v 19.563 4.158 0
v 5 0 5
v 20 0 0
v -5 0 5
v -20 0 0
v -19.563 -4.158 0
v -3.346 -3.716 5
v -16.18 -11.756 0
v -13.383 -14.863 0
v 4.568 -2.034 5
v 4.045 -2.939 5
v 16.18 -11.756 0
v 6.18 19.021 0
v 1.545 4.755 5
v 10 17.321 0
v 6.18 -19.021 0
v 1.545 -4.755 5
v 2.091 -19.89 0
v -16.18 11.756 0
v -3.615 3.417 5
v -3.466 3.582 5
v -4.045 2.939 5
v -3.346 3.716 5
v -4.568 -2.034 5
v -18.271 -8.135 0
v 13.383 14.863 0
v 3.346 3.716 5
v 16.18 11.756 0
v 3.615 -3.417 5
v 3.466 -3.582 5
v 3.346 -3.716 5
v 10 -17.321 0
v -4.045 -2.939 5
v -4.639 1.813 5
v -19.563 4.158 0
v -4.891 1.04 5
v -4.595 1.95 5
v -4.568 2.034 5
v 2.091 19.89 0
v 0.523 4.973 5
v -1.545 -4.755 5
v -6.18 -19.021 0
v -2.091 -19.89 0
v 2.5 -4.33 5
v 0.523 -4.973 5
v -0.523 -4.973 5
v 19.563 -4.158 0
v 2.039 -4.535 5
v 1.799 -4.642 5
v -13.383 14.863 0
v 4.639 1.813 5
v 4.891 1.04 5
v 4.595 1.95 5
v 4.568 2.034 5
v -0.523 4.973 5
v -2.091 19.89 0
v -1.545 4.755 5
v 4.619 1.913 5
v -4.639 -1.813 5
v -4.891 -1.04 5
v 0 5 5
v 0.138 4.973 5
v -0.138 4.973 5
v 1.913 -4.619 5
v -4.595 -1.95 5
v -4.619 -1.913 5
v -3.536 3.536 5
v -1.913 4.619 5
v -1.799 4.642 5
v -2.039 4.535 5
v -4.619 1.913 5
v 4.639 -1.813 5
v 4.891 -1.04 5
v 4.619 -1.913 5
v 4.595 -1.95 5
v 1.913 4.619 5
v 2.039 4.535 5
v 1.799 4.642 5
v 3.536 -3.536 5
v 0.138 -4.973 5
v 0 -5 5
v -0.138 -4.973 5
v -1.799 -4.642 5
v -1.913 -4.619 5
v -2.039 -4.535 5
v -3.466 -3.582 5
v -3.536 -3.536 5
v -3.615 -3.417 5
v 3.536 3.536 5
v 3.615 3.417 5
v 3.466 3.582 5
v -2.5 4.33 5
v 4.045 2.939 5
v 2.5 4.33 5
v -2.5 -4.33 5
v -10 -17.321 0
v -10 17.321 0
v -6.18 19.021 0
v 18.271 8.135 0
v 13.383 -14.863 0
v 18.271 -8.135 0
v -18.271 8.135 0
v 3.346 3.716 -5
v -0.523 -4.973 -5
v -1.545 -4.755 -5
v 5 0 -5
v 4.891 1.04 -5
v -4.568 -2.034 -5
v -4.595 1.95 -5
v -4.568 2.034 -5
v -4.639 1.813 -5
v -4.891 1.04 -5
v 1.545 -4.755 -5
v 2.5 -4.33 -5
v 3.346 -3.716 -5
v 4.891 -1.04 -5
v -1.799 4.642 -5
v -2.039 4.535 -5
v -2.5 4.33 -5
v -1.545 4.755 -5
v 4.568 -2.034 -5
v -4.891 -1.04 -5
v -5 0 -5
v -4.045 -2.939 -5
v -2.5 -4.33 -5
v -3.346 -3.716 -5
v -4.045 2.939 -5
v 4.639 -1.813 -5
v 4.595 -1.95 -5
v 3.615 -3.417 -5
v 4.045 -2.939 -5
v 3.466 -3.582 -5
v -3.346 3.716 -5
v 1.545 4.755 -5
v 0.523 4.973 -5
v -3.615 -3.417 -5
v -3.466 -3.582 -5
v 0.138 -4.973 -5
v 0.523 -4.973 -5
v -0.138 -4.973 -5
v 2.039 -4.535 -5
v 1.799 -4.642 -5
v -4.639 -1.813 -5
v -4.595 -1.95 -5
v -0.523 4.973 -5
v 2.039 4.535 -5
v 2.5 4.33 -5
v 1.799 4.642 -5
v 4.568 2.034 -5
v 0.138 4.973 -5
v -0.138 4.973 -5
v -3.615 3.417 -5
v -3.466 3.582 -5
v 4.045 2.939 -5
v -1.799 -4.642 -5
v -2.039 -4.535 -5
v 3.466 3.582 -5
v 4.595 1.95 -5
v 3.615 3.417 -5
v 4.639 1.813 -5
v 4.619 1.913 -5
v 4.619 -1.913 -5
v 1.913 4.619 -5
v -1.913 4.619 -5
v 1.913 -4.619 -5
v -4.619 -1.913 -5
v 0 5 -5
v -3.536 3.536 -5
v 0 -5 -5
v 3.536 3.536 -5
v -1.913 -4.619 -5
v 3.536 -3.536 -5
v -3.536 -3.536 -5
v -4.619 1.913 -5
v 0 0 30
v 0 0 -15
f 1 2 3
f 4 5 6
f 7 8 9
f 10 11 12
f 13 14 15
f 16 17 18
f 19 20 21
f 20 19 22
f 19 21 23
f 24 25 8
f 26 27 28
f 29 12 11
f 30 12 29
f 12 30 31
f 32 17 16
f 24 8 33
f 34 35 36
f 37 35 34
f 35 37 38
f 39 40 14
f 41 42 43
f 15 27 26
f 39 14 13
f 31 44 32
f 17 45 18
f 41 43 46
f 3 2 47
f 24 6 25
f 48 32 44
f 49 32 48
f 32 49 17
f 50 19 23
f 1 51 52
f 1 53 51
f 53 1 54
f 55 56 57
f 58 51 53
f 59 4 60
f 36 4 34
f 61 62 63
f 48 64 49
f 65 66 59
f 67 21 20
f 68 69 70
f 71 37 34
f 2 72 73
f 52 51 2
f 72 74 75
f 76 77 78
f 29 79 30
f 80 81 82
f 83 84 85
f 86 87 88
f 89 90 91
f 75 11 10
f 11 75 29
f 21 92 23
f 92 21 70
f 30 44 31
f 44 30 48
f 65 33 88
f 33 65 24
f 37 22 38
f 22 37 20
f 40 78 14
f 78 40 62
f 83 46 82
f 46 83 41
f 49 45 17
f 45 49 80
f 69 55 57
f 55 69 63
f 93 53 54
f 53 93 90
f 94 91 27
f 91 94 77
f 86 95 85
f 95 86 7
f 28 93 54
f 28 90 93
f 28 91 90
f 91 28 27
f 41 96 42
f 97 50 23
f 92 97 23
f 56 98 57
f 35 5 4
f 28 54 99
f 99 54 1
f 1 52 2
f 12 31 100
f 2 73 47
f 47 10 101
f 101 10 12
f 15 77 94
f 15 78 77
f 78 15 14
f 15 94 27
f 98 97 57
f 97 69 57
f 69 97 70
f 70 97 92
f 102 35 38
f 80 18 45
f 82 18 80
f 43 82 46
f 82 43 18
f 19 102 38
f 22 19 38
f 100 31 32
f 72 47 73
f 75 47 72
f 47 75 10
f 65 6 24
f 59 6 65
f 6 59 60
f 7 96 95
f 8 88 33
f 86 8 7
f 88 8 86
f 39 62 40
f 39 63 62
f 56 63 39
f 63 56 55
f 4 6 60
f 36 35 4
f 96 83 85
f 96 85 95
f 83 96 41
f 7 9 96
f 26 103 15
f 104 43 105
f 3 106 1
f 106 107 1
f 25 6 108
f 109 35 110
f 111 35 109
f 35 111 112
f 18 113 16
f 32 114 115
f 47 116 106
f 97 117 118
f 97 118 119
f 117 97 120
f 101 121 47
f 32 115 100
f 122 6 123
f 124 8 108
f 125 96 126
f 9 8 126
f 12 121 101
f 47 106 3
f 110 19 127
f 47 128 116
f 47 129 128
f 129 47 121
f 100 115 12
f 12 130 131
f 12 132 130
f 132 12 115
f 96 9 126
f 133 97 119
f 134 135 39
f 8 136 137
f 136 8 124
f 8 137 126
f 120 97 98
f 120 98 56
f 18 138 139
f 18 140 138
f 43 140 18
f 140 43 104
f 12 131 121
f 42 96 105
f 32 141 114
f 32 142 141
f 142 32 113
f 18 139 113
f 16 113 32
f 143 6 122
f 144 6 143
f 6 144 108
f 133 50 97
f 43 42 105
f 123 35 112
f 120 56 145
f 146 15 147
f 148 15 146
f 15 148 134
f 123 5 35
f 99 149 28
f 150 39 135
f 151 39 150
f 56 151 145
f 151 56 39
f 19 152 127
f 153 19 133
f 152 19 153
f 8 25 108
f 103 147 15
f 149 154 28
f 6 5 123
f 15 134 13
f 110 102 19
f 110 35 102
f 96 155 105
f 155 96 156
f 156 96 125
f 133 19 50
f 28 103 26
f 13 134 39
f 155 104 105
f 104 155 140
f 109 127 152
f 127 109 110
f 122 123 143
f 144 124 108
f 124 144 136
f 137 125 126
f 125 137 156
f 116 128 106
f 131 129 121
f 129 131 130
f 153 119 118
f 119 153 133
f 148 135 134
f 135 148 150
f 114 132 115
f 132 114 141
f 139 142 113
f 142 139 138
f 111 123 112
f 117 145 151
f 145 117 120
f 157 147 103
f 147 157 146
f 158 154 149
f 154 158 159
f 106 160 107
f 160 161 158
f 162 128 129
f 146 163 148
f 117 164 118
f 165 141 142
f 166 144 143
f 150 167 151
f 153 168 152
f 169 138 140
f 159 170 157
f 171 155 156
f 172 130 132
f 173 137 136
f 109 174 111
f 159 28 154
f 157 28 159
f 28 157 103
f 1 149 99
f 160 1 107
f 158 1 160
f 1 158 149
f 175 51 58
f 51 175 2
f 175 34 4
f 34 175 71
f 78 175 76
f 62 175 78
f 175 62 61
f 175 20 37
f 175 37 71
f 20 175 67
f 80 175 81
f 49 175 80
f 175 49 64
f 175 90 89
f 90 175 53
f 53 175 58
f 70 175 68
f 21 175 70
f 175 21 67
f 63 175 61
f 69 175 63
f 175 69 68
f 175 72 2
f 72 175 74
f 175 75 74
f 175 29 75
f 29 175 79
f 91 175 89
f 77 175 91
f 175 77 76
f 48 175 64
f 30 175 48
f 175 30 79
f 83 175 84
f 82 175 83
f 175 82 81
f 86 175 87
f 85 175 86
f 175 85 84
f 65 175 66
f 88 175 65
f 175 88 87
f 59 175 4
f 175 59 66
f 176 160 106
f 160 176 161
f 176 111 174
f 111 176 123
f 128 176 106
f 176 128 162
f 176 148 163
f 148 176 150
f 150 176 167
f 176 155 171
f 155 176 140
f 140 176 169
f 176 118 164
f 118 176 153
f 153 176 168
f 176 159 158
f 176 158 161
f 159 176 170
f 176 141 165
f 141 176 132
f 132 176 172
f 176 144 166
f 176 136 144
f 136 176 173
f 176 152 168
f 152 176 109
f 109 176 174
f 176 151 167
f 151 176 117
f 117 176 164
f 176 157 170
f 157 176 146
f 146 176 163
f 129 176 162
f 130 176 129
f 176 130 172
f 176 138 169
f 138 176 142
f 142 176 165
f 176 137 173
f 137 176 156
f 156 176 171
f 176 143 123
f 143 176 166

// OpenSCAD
cylinder (5, 20, 5);
translate ([0, 0, -5])cylinder (5, 5, 20);
translate ([0, 0, 5])cylinder (25, 5, 0);
translate ([0, 0, -15])cylinder (10, 0, 5); 
